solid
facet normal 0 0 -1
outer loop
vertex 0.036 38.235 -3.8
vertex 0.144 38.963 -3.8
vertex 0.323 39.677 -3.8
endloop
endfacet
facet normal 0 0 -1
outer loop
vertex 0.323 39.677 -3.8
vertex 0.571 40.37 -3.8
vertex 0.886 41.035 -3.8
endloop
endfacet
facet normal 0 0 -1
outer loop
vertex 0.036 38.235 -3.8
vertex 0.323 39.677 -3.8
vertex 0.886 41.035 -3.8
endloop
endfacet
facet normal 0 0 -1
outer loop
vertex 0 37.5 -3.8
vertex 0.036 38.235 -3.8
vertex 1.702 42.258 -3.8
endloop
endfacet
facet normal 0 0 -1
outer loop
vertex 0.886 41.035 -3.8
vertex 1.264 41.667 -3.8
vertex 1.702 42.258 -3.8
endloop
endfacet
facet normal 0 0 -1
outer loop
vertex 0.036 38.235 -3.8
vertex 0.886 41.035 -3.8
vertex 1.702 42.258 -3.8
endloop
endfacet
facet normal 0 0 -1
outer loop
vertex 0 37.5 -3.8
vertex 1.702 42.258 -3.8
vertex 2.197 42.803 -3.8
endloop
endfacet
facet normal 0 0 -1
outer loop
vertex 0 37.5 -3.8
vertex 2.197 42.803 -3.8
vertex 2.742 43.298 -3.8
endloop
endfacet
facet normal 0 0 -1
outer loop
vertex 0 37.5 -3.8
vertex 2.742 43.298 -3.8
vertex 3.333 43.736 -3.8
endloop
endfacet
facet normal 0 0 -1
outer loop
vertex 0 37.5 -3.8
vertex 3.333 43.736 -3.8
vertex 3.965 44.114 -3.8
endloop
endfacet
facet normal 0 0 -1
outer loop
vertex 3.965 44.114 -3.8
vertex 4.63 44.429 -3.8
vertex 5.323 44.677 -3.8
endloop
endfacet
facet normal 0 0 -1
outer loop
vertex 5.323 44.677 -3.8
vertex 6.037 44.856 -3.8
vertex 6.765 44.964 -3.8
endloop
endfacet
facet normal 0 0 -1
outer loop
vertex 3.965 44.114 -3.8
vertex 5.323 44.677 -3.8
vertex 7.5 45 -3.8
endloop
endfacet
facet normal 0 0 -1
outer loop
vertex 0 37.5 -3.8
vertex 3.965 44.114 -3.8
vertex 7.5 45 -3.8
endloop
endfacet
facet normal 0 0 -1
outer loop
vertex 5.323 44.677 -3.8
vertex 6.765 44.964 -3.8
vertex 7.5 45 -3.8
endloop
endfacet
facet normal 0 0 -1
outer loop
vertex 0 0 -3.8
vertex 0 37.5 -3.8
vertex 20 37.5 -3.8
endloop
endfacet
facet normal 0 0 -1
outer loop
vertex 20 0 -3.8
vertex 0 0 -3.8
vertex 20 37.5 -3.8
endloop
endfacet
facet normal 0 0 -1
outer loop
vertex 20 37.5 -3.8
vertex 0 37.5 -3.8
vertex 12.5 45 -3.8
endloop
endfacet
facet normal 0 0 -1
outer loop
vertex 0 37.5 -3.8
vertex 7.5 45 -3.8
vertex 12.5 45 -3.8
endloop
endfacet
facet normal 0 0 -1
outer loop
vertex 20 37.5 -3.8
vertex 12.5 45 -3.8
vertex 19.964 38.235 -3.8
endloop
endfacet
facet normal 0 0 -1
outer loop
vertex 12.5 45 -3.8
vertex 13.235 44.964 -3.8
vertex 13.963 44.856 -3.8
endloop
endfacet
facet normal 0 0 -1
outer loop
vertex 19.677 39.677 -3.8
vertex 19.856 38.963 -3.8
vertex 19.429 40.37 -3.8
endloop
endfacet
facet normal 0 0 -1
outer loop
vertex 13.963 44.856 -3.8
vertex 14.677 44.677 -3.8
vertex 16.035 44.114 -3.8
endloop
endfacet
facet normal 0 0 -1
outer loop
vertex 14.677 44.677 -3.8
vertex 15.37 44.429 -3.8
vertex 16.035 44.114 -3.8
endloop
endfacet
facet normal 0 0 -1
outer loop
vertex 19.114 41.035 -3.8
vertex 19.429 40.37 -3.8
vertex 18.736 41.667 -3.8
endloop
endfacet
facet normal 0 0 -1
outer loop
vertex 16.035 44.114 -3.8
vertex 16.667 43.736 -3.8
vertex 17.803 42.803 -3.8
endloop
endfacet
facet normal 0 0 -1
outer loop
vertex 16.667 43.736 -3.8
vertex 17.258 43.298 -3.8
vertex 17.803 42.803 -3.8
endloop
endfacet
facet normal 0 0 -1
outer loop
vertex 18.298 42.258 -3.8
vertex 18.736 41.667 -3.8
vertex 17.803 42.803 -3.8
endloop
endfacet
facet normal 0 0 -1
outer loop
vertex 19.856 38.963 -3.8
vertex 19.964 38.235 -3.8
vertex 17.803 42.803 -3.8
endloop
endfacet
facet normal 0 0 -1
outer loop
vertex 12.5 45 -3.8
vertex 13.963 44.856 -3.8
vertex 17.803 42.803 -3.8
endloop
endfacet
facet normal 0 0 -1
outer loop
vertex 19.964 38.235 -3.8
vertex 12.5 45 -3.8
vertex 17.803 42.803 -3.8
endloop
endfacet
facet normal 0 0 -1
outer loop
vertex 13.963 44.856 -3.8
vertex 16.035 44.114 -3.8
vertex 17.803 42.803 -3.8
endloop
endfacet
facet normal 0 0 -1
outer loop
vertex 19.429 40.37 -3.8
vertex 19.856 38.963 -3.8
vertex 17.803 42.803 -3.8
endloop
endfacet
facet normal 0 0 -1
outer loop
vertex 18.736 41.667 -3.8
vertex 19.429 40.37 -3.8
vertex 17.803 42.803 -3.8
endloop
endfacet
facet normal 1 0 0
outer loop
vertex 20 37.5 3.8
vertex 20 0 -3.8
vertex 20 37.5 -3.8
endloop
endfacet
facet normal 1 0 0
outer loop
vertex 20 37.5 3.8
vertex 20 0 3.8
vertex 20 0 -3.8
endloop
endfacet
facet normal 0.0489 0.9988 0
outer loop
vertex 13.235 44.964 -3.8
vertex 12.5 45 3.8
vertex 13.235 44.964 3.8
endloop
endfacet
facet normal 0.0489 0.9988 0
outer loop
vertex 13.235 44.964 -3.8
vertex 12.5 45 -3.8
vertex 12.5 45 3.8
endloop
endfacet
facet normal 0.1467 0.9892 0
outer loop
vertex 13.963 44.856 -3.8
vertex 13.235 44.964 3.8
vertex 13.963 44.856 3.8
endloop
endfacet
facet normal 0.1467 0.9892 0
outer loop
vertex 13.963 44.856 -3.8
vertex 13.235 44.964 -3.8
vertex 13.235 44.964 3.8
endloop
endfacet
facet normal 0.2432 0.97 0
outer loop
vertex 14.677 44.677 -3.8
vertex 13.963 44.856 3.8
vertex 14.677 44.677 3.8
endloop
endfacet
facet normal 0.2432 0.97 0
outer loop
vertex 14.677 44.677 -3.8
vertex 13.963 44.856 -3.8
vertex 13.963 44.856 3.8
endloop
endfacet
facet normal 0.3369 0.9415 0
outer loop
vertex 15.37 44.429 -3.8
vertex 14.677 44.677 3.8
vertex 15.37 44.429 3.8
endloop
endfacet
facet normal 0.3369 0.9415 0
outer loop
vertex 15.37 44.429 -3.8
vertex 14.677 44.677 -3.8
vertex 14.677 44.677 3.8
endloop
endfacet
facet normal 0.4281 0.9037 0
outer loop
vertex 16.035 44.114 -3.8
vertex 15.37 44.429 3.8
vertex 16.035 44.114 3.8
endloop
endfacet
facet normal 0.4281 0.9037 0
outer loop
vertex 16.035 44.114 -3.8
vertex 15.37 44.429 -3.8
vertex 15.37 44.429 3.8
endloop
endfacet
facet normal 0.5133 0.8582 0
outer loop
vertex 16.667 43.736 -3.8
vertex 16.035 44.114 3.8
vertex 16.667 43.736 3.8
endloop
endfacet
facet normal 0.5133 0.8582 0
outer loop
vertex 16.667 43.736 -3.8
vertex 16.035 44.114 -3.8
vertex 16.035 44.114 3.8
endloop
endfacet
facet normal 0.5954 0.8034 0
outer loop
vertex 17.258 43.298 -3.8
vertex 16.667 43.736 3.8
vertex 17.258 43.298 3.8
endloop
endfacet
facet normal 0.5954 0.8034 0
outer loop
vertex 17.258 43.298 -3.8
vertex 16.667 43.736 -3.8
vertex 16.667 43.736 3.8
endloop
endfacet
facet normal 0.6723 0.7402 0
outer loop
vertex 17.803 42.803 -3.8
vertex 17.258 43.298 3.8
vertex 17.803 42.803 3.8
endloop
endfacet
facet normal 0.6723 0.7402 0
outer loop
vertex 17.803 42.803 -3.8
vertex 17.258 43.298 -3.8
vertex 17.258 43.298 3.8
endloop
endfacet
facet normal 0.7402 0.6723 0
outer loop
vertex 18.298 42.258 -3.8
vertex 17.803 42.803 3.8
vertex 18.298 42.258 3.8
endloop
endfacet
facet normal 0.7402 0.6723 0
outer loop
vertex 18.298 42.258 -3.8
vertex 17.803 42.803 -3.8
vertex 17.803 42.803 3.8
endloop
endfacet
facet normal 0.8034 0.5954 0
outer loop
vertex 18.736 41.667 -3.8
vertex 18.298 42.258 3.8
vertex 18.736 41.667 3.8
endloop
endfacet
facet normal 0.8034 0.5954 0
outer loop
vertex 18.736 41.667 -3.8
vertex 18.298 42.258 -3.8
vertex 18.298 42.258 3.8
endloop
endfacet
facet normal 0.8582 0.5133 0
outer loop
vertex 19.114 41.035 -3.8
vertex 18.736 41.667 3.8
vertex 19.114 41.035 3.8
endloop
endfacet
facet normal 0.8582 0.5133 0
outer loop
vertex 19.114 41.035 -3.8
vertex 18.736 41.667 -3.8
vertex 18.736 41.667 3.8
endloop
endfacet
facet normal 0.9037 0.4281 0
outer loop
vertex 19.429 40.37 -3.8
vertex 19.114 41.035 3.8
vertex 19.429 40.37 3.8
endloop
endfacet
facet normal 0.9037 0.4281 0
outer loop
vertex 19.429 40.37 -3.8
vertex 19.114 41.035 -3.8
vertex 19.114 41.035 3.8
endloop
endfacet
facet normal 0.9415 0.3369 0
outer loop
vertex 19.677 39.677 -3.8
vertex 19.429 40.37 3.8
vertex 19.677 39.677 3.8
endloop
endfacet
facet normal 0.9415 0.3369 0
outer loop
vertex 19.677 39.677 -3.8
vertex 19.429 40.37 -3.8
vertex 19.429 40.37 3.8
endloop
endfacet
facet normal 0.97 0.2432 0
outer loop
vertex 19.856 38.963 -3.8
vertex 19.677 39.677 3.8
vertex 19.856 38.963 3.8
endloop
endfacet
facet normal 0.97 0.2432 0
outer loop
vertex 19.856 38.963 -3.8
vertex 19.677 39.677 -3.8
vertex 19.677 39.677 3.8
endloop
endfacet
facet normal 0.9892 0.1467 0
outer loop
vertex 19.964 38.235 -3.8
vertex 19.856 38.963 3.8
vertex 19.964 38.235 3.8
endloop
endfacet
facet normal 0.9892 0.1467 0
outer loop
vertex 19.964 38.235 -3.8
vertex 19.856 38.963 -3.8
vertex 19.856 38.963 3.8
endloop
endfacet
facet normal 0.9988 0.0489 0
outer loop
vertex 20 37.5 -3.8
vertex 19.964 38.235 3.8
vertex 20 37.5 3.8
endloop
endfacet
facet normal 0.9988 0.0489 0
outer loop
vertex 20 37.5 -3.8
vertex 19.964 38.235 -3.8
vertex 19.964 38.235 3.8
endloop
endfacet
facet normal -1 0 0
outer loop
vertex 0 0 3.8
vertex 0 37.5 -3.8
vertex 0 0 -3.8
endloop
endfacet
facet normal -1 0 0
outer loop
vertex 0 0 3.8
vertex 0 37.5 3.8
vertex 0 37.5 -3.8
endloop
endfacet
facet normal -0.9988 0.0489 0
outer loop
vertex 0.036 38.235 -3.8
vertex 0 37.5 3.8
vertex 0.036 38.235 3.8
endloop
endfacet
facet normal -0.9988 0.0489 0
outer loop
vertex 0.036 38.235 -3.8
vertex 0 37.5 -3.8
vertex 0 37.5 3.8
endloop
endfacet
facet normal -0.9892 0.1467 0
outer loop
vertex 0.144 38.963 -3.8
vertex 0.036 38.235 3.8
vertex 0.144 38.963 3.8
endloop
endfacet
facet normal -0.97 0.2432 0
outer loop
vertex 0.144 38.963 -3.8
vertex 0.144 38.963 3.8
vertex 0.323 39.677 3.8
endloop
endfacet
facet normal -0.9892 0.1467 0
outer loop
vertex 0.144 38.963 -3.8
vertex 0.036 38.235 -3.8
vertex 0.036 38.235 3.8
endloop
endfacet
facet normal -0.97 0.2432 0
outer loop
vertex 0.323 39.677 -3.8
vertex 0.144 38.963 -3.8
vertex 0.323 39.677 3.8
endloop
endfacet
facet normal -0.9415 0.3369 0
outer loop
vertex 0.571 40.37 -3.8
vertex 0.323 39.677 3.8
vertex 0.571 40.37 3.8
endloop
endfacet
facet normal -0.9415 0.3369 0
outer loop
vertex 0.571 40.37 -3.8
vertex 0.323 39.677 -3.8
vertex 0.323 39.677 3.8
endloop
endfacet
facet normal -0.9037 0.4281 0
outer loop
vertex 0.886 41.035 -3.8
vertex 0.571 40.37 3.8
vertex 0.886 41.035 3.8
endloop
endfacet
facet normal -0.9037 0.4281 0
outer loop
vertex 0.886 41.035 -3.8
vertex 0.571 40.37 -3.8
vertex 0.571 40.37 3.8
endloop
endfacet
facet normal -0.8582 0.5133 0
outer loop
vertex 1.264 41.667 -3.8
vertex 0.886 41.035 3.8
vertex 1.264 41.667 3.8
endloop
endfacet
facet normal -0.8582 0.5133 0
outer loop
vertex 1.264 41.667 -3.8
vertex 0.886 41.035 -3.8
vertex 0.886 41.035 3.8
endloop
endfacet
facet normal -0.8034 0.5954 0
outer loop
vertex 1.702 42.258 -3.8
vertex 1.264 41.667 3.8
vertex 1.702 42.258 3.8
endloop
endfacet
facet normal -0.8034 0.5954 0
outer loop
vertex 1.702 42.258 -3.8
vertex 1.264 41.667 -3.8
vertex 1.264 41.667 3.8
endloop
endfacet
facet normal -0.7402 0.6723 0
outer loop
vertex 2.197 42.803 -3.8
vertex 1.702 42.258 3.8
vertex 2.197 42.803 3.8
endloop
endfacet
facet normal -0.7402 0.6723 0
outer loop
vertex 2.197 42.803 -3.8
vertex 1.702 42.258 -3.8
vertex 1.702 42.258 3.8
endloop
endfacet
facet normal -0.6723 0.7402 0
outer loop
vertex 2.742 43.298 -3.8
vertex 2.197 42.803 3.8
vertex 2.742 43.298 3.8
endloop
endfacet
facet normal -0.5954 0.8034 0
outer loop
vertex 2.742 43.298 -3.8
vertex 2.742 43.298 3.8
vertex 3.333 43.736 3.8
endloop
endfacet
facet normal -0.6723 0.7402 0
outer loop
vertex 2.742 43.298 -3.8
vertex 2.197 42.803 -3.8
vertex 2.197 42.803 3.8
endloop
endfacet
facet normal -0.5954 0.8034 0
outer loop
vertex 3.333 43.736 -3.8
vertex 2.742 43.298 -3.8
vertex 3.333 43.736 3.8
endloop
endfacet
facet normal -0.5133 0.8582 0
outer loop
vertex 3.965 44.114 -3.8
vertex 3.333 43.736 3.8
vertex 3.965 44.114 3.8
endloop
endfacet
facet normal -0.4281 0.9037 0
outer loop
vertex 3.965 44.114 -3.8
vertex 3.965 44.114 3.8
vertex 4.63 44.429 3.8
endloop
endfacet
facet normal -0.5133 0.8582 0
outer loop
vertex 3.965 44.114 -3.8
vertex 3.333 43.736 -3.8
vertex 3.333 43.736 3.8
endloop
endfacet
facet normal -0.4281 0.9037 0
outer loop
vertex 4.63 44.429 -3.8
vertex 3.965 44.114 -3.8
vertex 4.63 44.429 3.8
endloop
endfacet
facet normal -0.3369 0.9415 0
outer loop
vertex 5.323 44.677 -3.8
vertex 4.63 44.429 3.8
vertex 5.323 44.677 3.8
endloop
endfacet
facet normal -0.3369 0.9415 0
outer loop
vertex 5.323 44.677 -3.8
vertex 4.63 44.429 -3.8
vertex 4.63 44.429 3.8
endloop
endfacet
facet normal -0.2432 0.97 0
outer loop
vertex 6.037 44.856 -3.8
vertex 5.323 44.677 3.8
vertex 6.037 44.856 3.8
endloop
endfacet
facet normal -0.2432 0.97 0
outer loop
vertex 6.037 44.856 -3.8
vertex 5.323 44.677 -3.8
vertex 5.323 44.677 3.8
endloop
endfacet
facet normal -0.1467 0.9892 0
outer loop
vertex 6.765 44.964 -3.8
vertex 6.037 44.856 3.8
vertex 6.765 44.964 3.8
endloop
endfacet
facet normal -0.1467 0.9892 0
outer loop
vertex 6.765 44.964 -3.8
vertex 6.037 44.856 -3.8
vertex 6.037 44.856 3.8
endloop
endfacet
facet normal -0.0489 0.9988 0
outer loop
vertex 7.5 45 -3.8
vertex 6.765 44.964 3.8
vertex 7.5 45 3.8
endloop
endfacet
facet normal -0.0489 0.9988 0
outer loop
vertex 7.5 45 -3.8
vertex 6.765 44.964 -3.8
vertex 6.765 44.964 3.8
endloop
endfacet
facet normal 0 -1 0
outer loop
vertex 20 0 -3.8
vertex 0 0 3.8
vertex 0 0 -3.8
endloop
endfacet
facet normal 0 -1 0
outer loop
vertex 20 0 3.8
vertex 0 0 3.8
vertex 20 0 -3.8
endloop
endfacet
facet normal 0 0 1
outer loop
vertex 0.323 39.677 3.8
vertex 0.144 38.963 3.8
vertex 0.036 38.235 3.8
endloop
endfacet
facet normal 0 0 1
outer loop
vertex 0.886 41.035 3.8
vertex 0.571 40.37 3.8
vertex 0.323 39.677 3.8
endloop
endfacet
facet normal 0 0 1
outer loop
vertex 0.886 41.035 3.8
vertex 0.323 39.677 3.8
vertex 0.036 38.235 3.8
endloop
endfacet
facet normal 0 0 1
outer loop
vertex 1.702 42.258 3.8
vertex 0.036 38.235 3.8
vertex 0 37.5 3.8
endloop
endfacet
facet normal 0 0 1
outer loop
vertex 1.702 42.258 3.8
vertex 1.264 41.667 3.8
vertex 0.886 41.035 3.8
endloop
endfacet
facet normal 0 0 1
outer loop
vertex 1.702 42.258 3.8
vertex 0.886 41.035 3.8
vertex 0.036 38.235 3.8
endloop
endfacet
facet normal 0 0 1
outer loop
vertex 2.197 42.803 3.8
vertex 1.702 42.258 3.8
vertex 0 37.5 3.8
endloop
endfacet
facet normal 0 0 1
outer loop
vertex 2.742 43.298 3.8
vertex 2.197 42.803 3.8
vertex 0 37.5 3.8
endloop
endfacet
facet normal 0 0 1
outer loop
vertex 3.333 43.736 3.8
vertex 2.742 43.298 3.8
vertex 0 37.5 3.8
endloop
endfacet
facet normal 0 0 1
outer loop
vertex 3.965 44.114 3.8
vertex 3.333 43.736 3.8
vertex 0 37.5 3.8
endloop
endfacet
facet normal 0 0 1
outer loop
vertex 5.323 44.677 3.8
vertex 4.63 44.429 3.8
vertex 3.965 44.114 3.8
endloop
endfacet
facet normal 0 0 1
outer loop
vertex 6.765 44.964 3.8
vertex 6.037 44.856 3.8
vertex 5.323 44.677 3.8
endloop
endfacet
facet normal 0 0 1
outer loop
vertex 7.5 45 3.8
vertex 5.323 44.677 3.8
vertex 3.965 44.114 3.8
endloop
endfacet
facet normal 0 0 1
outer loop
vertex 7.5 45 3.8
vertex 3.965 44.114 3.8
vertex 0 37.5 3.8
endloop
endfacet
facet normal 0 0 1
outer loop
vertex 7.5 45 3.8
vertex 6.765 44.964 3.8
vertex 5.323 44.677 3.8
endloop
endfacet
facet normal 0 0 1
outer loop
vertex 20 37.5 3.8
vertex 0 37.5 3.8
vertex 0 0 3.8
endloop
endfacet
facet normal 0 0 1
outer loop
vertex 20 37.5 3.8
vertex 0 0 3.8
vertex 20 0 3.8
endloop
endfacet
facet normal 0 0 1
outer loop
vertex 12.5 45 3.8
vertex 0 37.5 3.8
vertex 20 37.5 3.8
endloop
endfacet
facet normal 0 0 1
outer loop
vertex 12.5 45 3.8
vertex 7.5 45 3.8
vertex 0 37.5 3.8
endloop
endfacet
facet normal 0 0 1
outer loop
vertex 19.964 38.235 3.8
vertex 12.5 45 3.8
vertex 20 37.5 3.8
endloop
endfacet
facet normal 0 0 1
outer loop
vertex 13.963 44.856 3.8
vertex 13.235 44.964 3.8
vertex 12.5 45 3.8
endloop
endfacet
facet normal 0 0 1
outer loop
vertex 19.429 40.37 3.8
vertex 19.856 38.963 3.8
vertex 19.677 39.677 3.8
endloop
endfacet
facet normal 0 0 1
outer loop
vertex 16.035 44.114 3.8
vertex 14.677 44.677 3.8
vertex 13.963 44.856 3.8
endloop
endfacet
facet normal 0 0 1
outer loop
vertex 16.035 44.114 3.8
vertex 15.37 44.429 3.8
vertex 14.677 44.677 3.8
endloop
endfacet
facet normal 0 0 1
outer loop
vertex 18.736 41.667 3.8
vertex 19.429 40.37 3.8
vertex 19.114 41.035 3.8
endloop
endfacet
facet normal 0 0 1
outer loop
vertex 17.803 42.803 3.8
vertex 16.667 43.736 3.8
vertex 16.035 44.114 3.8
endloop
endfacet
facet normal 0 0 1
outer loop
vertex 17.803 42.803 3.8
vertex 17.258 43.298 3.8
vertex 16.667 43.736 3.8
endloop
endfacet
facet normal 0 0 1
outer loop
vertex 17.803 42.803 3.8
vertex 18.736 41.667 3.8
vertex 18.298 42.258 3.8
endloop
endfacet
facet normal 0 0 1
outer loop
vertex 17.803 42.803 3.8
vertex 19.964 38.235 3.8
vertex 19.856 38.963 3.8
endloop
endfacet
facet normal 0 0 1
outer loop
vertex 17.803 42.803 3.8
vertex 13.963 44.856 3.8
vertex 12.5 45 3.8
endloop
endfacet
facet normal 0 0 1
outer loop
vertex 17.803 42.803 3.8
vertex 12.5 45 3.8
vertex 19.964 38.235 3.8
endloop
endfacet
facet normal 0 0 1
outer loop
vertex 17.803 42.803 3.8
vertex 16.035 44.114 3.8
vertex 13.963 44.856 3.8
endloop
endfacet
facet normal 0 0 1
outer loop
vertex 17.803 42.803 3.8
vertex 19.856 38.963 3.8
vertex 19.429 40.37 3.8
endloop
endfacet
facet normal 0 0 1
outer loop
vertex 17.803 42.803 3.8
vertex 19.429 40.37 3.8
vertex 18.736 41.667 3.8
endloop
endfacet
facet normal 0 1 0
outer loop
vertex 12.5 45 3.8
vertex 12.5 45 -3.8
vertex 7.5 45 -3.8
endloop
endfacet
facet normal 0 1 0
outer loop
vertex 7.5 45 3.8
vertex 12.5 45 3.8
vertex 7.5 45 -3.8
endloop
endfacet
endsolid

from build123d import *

# Parameters (mm, degrees)
F1_DEPTH      = 3.8
F1_DEPTH_BACK = 3.8
F2_R          = 7.5


with BuildPart() as f1:
    # F0 (on Top) → F1 (new body, two sides)
    with BuildSketch(Plane.XY) as f1_sk:
        Polygon((0, 45), (0, 0), (10, 0), (20, 0), (20, 45), align=None)
    extrude(amount=F1_DEPTH)
    extrude(f1_sk.sketch, amount=-F1_DEPTH_BACK)

    # F2
    f2_edges = [f1.edges().sort_by_distance(p)[0] for p in [
        (20, 45, 0),
        (0, 45, 0),
    ]]
    fillet(f2_edges, radius=F2_R)


solid = f1.part
